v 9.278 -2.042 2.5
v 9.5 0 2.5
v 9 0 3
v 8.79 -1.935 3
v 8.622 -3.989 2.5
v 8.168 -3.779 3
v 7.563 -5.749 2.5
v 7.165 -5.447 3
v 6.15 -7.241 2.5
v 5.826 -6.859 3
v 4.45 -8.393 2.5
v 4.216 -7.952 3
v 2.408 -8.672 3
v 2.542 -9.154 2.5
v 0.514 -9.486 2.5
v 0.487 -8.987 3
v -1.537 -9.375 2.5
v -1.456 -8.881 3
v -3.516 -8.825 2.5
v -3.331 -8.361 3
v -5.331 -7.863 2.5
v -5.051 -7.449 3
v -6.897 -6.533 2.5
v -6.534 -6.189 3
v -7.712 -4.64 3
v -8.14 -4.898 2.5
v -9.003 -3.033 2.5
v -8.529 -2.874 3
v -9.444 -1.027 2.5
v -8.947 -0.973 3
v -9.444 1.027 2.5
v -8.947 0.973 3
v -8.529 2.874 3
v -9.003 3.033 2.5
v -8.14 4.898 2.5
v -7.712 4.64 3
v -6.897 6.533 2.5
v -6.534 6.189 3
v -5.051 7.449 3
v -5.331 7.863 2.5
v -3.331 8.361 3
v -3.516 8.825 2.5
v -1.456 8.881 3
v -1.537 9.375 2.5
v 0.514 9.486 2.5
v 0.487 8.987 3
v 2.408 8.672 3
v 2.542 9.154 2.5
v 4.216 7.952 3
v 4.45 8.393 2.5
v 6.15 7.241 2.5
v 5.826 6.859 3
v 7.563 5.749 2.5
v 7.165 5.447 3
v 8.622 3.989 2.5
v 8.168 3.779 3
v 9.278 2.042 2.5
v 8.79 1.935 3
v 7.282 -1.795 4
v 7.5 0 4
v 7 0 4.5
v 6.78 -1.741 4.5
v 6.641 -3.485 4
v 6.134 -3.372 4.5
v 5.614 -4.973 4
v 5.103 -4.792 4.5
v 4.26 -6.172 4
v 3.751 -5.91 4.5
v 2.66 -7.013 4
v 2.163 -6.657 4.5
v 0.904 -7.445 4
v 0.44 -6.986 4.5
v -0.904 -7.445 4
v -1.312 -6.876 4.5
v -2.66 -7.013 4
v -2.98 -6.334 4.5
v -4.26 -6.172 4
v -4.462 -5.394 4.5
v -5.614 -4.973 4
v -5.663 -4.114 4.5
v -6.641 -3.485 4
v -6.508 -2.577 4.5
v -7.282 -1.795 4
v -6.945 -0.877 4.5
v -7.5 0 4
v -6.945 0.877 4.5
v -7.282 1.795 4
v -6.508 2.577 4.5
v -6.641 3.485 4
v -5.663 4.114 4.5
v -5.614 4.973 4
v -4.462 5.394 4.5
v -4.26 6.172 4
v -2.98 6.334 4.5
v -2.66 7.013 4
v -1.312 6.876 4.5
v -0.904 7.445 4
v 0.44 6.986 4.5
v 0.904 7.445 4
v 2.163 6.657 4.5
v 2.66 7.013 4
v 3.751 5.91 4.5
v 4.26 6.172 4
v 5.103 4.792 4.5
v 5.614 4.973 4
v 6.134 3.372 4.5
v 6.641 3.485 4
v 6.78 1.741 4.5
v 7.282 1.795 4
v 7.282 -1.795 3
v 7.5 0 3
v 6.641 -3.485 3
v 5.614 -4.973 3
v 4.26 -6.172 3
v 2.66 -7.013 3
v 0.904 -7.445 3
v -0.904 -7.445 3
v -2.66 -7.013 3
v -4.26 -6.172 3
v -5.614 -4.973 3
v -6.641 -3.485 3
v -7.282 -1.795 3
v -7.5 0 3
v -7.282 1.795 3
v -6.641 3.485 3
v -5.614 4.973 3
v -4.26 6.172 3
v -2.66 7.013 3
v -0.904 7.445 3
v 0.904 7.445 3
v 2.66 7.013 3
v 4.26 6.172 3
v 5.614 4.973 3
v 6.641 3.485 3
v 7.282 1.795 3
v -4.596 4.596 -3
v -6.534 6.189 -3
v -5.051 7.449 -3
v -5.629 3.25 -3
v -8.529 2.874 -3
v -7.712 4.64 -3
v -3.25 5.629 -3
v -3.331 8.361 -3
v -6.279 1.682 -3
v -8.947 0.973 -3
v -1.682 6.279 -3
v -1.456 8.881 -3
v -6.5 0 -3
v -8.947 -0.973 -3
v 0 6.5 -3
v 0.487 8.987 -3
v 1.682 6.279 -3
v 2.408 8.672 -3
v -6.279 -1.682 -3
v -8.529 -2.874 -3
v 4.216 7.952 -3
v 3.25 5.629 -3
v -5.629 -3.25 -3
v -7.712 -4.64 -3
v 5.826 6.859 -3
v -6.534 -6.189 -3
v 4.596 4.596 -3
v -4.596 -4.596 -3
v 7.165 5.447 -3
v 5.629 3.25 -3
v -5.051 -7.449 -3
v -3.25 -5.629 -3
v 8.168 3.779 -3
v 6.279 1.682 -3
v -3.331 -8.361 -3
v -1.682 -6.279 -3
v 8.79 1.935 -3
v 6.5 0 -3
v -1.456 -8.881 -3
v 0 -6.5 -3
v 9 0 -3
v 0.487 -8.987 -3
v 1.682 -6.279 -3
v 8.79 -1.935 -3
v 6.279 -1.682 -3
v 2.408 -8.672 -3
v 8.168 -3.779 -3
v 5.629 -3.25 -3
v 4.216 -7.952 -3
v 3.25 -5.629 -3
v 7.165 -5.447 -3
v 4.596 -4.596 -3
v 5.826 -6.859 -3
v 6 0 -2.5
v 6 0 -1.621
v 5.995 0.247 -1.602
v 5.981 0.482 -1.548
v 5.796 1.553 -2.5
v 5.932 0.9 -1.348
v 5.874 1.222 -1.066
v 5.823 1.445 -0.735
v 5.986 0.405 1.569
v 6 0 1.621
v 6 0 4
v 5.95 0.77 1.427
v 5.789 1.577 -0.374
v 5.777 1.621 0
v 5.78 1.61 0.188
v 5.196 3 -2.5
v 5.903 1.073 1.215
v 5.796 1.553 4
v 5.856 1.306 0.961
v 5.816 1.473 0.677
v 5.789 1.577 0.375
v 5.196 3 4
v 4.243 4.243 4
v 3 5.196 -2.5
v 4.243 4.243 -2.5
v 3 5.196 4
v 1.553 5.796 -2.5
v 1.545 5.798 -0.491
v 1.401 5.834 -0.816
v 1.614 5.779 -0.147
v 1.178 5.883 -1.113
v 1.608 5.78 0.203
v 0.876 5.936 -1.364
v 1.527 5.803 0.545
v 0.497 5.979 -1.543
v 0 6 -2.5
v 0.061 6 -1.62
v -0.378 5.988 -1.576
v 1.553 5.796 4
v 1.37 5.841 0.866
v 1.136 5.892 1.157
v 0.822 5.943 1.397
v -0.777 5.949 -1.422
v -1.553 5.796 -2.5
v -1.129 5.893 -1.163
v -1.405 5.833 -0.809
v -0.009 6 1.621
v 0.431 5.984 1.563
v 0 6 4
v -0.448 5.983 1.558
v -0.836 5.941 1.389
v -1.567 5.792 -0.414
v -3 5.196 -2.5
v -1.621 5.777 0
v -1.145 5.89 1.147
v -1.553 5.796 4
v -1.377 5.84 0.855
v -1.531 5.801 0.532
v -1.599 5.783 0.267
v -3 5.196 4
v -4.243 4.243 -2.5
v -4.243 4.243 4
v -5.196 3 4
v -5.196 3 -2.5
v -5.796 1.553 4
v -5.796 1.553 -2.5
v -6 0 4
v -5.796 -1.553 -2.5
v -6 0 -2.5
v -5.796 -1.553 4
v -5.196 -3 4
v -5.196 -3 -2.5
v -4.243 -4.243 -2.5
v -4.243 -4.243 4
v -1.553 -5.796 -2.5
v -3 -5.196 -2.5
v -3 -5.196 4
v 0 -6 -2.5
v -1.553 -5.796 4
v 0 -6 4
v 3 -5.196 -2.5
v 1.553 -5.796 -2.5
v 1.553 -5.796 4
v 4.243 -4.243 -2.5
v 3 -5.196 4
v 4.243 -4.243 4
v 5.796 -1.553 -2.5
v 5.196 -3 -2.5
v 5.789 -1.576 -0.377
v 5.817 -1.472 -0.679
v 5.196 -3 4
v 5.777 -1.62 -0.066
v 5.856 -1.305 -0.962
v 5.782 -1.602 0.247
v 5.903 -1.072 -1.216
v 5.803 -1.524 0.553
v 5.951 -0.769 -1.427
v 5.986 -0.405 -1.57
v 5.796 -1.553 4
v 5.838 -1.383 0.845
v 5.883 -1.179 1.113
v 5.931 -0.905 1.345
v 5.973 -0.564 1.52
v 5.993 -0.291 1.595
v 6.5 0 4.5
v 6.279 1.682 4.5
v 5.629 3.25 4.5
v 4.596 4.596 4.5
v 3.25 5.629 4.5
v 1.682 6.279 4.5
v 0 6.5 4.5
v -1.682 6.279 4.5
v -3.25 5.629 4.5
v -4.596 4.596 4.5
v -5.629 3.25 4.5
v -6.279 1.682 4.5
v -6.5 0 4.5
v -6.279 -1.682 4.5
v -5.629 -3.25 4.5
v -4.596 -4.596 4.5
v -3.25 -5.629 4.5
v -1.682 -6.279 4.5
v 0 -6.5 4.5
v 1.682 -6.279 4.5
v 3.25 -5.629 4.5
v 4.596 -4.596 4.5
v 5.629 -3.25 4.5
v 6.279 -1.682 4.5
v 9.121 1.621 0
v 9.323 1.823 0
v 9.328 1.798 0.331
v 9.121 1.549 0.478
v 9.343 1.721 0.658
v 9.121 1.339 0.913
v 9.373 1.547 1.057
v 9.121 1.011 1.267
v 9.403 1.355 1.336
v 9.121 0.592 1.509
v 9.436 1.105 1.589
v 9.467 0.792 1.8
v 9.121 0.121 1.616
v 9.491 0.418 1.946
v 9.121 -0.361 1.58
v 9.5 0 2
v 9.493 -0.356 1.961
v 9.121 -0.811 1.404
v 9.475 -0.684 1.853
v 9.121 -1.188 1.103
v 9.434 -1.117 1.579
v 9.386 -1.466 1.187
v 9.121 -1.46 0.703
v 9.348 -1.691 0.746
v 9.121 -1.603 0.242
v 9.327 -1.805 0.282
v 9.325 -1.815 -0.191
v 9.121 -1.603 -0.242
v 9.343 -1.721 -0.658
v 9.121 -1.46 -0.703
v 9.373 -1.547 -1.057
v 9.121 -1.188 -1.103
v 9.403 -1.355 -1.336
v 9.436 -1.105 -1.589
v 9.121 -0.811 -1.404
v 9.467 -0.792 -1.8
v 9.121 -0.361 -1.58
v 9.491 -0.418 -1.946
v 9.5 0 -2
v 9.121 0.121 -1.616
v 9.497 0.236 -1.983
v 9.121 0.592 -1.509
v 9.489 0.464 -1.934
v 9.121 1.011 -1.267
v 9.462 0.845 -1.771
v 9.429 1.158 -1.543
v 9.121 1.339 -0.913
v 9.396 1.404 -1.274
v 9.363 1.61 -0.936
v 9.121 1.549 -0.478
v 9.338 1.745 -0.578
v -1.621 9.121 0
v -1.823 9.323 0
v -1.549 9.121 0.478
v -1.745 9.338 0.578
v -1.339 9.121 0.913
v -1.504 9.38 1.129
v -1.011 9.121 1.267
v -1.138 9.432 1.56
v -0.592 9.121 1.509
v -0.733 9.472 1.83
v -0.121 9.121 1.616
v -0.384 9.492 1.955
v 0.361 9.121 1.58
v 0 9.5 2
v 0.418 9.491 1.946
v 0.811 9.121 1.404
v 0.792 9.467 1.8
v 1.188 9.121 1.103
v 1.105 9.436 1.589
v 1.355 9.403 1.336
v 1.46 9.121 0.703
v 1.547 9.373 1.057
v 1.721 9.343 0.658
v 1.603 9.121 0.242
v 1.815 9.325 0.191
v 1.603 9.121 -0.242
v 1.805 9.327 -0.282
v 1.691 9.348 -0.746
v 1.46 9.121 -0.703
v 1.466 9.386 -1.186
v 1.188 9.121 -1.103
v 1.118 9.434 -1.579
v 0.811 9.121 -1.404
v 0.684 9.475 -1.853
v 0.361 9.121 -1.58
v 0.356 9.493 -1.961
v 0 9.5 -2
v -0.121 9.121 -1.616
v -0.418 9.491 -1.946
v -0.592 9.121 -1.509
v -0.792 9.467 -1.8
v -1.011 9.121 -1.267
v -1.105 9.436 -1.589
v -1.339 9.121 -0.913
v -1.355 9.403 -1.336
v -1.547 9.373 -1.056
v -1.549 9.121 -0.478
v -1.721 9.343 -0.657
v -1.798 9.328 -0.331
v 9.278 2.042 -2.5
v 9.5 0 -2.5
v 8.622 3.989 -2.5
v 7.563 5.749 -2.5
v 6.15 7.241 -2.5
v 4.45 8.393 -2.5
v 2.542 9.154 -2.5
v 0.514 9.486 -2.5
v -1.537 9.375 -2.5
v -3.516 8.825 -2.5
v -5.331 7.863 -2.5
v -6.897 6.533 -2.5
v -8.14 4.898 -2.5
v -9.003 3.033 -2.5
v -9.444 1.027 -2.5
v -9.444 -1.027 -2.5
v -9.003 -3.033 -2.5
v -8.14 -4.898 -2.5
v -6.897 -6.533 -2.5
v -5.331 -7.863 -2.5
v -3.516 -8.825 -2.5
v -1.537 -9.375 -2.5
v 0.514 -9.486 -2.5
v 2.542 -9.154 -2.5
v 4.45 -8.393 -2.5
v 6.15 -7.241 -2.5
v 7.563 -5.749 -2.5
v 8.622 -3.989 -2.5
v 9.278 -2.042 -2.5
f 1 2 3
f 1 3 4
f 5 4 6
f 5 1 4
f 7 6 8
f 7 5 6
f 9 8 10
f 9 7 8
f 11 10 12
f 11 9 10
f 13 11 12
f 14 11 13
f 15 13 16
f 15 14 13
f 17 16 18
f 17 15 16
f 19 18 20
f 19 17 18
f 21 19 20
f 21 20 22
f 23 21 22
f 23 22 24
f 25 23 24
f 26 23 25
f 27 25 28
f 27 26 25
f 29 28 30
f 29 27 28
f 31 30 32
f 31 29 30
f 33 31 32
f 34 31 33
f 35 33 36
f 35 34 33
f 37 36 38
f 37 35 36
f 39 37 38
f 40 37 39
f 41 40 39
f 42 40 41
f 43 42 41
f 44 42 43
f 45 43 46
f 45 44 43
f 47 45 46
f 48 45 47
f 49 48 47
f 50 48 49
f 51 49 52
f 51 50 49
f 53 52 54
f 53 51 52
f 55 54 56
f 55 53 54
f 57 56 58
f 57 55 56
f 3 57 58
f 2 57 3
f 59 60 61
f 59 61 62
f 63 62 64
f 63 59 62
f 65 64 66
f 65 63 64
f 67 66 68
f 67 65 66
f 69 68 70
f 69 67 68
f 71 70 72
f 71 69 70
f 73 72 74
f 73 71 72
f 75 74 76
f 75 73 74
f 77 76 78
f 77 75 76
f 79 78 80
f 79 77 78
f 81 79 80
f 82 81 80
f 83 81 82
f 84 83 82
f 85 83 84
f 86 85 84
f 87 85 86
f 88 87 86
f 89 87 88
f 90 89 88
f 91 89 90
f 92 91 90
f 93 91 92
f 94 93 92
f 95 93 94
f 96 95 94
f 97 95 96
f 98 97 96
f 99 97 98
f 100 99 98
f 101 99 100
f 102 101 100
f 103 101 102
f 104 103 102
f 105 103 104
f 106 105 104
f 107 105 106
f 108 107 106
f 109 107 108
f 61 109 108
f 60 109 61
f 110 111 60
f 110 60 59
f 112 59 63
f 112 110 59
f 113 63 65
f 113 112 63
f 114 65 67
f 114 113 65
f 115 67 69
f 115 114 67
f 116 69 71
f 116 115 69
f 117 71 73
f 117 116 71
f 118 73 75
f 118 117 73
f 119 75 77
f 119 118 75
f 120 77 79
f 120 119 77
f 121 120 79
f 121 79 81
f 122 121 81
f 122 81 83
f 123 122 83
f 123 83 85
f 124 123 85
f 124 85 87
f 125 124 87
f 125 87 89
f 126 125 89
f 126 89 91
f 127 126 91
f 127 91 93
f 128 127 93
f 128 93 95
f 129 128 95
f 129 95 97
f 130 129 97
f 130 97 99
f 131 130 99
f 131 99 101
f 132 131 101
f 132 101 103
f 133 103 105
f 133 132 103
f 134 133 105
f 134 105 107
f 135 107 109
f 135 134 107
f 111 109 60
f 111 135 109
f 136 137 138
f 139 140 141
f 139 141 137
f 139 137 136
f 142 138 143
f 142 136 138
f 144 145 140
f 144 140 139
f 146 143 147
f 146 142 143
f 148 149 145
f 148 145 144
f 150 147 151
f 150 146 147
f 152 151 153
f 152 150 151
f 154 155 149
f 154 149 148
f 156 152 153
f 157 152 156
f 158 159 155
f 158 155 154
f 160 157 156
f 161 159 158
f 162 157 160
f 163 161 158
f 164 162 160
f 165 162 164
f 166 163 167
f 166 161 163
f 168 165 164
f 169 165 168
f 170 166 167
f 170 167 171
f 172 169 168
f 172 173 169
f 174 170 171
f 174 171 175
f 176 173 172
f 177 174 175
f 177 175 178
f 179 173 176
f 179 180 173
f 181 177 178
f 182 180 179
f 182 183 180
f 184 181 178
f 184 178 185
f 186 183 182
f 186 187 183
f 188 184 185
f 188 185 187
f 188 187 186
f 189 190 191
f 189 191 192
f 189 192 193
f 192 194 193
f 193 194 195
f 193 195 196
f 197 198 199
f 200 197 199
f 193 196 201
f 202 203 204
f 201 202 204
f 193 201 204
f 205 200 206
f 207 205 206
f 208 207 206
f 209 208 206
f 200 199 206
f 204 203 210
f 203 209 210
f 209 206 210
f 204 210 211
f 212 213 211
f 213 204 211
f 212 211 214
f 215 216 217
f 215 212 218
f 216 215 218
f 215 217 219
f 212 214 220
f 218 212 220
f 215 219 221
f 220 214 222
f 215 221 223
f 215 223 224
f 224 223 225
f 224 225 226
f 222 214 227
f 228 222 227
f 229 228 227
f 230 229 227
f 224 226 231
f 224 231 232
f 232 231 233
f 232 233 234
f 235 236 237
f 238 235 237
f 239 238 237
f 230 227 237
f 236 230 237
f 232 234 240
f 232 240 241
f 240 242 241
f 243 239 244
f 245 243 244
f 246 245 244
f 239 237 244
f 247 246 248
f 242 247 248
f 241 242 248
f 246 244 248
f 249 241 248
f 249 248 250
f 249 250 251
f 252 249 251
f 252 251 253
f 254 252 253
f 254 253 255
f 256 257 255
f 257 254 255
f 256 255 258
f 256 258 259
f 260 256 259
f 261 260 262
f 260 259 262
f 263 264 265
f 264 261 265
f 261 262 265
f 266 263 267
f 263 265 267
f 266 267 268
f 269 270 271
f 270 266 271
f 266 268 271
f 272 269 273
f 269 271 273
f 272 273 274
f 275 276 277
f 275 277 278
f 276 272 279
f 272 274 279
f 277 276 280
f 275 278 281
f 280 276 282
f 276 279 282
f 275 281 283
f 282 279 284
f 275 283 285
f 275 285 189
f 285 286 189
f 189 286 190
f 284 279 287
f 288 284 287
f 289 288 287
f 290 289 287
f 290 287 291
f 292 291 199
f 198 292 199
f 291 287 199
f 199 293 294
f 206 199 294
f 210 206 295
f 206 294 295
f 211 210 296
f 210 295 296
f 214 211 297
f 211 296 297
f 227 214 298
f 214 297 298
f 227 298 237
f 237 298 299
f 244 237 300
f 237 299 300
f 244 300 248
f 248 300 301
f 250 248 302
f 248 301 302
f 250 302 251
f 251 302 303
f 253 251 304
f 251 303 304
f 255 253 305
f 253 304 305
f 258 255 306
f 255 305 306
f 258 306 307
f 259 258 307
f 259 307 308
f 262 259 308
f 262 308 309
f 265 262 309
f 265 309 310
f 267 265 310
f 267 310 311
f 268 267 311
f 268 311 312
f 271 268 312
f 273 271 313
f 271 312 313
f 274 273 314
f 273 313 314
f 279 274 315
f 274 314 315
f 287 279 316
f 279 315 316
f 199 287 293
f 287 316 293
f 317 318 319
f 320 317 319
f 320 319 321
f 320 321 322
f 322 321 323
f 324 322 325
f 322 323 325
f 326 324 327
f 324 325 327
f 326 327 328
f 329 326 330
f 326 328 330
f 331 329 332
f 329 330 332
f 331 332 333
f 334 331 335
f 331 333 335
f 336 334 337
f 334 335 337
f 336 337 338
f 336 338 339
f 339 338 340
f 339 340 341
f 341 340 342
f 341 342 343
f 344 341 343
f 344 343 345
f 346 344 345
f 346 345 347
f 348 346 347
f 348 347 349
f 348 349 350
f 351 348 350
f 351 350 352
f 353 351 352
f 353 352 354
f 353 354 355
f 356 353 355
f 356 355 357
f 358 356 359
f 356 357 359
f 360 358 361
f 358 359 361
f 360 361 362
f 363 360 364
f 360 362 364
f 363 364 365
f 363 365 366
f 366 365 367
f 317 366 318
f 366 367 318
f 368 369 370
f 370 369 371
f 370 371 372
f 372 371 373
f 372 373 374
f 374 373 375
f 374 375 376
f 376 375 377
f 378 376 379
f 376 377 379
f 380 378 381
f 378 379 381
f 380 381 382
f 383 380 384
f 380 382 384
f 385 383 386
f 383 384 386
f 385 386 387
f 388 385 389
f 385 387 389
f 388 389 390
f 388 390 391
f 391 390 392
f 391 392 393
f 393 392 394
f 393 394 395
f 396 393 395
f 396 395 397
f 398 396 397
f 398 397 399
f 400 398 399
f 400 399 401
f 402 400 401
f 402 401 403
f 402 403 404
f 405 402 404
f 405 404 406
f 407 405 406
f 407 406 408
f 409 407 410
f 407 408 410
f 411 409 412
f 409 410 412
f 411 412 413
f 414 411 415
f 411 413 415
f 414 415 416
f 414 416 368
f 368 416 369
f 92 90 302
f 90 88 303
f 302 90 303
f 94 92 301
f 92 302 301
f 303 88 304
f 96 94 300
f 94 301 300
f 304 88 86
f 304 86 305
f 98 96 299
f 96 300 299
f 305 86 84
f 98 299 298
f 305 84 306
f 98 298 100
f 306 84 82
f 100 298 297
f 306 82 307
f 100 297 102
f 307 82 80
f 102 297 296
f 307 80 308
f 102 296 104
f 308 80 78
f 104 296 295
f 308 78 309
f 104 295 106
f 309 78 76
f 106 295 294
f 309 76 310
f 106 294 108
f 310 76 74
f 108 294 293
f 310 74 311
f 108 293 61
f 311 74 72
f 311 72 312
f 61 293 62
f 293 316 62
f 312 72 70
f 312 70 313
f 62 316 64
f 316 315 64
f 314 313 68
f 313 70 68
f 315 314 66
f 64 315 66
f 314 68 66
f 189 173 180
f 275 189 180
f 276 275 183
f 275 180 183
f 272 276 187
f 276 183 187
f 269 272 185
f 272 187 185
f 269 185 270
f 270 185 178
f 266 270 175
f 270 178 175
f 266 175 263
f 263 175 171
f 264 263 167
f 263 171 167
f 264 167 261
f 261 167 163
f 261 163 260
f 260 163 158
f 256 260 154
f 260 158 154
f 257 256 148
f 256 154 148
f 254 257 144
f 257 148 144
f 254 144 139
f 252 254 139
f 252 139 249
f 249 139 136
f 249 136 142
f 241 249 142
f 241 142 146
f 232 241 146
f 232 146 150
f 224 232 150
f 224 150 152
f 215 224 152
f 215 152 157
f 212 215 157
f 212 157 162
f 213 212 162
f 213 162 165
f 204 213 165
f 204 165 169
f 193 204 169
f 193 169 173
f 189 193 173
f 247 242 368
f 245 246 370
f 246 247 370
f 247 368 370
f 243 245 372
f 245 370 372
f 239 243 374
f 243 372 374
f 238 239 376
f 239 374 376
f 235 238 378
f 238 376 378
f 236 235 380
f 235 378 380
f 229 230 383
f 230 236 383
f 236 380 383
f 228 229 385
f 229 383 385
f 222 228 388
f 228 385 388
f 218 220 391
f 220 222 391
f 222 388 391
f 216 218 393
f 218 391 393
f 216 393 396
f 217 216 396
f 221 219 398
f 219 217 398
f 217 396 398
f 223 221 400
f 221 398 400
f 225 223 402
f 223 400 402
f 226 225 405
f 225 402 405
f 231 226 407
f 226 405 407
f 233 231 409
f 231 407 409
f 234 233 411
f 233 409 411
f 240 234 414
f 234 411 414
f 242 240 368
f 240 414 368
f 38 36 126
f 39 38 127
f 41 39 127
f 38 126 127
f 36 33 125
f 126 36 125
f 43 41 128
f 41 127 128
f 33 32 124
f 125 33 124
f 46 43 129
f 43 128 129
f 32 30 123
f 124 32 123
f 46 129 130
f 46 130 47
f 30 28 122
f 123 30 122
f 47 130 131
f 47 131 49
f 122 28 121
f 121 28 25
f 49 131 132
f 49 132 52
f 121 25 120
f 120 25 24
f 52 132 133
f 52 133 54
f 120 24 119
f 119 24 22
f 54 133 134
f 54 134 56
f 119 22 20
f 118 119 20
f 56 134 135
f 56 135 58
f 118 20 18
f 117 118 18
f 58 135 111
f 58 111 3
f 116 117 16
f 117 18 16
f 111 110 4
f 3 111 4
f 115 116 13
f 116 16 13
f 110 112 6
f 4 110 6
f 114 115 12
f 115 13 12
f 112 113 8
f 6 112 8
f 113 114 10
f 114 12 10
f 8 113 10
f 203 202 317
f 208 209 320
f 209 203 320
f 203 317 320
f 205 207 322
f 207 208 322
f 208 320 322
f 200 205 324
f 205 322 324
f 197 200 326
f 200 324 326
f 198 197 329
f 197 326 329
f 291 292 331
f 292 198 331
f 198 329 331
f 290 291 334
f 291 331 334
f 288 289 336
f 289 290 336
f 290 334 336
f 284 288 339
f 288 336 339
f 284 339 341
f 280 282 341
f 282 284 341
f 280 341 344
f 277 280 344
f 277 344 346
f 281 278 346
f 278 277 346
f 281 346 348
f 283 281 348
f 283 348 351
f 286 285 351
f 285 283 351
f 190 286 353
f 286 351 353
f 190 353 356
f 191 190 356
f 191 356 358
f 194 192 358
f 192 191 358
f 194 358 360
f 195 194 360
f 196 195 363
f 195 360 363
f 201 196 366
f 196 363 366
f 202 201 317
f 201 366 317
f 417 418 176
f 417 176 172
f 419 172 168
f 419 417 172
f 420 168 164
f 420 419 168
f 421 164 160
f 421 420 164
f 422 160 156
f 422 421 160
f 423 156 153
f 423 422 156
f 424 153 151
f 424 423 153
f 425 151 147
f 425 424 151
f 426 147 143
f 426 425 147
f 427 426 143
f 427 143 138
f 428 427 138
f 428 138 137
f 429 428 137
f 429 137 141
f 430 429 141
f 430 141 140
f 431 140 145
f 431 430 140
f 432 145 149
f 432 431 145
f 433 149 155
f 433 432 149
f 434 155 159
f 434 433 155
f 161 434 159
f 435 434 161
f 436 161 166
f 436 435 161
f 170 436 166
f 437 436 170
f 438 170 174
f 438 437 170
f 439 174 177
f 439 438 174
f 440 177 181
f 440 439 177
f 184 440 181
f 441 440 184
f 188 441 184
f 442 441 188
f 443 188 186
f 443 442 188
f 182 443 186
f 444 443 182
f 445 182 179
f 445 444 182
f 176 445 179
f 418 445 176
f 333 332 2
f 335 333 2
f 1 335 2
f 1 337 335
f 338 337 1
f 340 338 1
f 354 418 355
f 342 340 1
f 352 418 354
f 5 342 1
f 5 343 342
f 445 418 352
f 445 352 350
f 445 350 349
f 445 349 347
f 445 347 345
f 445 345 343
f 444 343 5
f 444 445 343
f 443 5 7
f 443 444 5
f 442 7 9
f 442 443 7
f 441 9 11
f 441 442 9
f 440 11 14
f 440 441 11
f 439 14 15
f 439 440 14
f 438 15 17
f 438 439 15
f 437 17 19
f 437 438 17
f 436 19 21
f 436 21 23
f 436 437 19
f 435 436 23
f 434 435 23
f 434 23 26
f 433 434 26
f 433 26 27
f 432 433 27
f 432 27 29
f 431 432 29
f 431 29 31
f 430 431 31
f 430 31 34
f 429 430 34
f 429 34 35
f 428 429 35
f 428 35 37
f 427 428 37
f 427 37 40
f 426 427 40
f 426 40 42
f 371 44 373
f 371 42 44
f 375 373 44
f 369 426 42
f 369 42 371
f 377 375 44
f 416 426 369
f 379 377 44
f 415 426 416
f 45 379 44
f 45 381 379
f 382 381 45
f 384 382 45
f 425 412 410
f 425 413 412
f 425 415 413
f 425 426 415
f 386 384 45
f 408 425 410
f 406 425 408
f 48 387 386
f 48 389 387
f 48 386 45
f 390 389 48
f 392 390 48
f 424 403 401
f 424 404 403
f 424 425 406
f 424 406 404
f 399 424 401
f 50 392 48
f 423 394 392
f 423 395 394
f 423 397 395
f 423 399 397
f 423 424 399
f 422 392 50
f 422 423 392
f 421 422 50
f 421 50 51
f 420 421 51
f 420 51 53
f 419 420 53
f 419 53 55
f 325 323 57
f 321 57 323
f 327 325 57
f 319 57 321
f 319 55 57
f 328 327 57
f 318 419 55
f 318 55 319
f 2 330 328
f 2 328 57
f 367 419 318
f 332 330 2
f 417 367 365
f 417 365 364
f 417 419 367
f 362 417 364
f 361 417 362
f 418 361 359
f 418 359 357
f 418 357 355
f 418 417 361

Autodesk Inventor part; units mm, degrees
sketch "Sketch_1" plane through (0, 0, 0) normal (0, 1, 0) x (-1, 0, 0)
  line L0 (0, 4.5) -> (0, -3)
  line L1 (-6, 4) -> (-6.5, 4.5)
  line L2 (-6.5, 4.5) -> (-7, 4.5)
  line L3 (-7, 4.5) -> (-7.5, 4)
  line L4 (-7.5, 4) -> (-7.5, 3)
  line L5 (-7.5, 3) -> (-9, 3)
  line L6 (-9, 3) -> (-9.5, 2.5)
  line L7 (-9.5, 2.5) -> (-9.5, -2.5)
  line L8 (-9.5, -2.5) -> (-9, -3)
  line L9 (-9, -3) -> (-6.5, -3)
  line L10 (-6.5, -3) -> (-6, -2.5)
  line L11 (-6, -2.5) -> (-6, 4)
revolve "Revolution1" add sketch "Sketch_1" angle 360 about axis through (0, 0, 4.5) along (0, 0, -1)
sketch "Sketch_8" plane through (0, 0, 0) normal (0, 0, 1) x (1, 0, 0)
  line L0 (9.5, 0) -> (5, 0)
  line L1 (5, 0) -> (5, 1.621)
  line L2 (5, 1.621) -> (9.121, 1.621)
  line L3 (9.121, 1.621) -> (9.5, 2)
  line L4 (9.5, 2) -> (9.5, 0)
  line L5 (9.5, 0) -> (5, 0)
revolve "Revolution2" cut sketch "Sketch_8" angle 360 about axis through (9.5, 0, 0) along (-1, 0, 0)
thread "Thread1" size "M4x0.7" class "6H" standard "ISO Metric profile" full length
sketch "Sketch_2" plane through (0, 0, 0) normal (0, 0, 1) x (1, 0, 0)
  line L0 (0, 9.5) -> (0, 5)
  line L1 (0, 5) -> (-1.621, 5)
  line L2 (-1.621, 5) -> (-1.621, 9.121)
  line L3 (-1.621, 9.121) -> (-2, 9.5)
  line L4 (-2, 9.5) -> (0, 9.5)
  line L5 (0, 9.5) -> (0, 5)
revolve "Revolution3" cut sketch "Sketch_2" angle 360 about axis through (0, 9.5, 0) along (0, -1, 0)
thread "Thread2" size "M4x0.7" class "6H" standard "ISO Metric profile" full length
ref_plane "body_set_h_XY" through (0, 9.5, 0) normal (0, 1, 0) x (1, 0, 0)
ref_plane "body_set_h_YZ" through (0, 9.5, 0) normal (1, 0, 0) x (0, 0, -1)
ref_plane "body_set_h_ZX" through (0, 9.5, 0) normal (0, 0, -1) x (0, 1, 0)
ref_plane "body_set_v_XY" through (9.5, 0, 0) normal (1, 0, 0) x (0, 0, -1)
ref_plane "body_set_v_YZ" through (9.5, 0, 0) normal (0, 0, -1) x (0, 1, 0)
ref_plane "body_set_v_ZX" through (9.5, 0, 0) normal (0, 1, 0) x (1, 0, 0)
properties part number "SCBRJ12-15_b"
